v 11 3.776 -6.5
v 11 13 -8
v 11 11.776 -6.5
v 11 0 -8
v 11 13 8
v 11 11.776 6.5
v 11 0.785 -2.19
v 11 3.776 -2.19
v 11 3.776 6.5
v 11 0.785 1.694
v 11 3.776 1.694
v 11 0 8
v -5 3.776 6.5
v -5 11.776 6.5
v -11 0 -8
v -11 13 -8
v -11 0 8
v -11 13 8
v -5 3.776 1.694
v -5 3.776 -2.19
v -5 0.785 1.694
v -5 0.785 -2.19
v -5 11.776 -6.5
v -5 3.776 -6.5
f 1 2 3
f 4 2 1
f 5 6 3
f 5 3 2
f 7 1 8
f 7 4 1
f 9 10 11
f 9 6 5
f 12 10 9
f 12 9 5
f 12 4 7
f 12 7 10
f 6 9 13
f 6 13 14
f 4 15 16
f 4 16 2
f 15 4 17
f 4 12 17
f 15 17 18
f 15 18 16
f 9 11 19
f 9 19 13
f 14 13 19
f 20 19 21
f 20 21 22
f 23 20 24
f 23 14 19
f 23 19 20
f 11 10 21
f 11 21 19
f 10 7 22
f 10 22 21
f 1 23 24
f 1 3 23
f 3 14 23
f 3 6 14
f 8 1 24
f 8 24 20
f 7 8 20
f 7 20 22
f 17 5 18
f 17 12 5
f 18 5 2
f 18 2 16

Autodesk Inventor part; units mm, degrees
ref_plane "YZ Plane" through (0, 0, 0) normal (1, 0, 0) x (0, 1, 0)
ref_plane "XZ Plane" through (0, 0, 0) normal (0, 1, 0) x (-1, 0, 0)
ref_plane "XY Plane" through (0, 0, 0) normal (0, 0, 1) x (1, 0, 0)
sketch "Sketch1" plane through (0, 0, 0) normal (0, 1, 0) x (-1, 0, 0)
  line L0 (-11, 8) -> (11, 8)
  line L1 (11, 8) -> (11, -8)
  line L2 (11, -8) -> (-11, -8)
  line L3 (-11, -8) -> (-11, 8)
  line L4 (-11, 8) -> (11, -8) construction
  line L5 (11, 8) -> (-11, -8) construction
  point P0 (0, 0)
  dimension "d0" = 22
  dimension "d1" = 16
extrude "Extrusion1" add sketch "Sketch1" along normal blind 13
sketch "Sketch2" plane through (11, 0, 8) normal (1, 0, 0) x (0, 0, -1)
  line L0 (1.5, 11.7761) -> (14.5, 11.7761)
  line L1 (14.5, 11.7761) -> (14.5, 3.7761)
  line L2 (14.5, 3.7761) -> (1.5, 3.7761)
  line L3 (1.5, 3.7761) -> (1.5, 11.7761)
  line L4 (0, 0) -> (0, 13) projected
  line L5 (6.3059, 3.7761) -> (10.1899, 3.7761)
  line L6 (10.1899, 3.7761) -> (10.1899, 0.7851)
  line L7 (10.1899, 0.7851) -> (6.3059, 0.7851)
  line L8 (6.3059, 0.7851) -> (6.3059, 3.7761)
  point P0 (8, 0)
  dimension "d4" = 13
  dimension "d5" = 8
  dimension "d6" = 1.5
extrude "Extrusion2" cut sketch "Sketch2" against normal blind 16
properties part number "netwerk"
